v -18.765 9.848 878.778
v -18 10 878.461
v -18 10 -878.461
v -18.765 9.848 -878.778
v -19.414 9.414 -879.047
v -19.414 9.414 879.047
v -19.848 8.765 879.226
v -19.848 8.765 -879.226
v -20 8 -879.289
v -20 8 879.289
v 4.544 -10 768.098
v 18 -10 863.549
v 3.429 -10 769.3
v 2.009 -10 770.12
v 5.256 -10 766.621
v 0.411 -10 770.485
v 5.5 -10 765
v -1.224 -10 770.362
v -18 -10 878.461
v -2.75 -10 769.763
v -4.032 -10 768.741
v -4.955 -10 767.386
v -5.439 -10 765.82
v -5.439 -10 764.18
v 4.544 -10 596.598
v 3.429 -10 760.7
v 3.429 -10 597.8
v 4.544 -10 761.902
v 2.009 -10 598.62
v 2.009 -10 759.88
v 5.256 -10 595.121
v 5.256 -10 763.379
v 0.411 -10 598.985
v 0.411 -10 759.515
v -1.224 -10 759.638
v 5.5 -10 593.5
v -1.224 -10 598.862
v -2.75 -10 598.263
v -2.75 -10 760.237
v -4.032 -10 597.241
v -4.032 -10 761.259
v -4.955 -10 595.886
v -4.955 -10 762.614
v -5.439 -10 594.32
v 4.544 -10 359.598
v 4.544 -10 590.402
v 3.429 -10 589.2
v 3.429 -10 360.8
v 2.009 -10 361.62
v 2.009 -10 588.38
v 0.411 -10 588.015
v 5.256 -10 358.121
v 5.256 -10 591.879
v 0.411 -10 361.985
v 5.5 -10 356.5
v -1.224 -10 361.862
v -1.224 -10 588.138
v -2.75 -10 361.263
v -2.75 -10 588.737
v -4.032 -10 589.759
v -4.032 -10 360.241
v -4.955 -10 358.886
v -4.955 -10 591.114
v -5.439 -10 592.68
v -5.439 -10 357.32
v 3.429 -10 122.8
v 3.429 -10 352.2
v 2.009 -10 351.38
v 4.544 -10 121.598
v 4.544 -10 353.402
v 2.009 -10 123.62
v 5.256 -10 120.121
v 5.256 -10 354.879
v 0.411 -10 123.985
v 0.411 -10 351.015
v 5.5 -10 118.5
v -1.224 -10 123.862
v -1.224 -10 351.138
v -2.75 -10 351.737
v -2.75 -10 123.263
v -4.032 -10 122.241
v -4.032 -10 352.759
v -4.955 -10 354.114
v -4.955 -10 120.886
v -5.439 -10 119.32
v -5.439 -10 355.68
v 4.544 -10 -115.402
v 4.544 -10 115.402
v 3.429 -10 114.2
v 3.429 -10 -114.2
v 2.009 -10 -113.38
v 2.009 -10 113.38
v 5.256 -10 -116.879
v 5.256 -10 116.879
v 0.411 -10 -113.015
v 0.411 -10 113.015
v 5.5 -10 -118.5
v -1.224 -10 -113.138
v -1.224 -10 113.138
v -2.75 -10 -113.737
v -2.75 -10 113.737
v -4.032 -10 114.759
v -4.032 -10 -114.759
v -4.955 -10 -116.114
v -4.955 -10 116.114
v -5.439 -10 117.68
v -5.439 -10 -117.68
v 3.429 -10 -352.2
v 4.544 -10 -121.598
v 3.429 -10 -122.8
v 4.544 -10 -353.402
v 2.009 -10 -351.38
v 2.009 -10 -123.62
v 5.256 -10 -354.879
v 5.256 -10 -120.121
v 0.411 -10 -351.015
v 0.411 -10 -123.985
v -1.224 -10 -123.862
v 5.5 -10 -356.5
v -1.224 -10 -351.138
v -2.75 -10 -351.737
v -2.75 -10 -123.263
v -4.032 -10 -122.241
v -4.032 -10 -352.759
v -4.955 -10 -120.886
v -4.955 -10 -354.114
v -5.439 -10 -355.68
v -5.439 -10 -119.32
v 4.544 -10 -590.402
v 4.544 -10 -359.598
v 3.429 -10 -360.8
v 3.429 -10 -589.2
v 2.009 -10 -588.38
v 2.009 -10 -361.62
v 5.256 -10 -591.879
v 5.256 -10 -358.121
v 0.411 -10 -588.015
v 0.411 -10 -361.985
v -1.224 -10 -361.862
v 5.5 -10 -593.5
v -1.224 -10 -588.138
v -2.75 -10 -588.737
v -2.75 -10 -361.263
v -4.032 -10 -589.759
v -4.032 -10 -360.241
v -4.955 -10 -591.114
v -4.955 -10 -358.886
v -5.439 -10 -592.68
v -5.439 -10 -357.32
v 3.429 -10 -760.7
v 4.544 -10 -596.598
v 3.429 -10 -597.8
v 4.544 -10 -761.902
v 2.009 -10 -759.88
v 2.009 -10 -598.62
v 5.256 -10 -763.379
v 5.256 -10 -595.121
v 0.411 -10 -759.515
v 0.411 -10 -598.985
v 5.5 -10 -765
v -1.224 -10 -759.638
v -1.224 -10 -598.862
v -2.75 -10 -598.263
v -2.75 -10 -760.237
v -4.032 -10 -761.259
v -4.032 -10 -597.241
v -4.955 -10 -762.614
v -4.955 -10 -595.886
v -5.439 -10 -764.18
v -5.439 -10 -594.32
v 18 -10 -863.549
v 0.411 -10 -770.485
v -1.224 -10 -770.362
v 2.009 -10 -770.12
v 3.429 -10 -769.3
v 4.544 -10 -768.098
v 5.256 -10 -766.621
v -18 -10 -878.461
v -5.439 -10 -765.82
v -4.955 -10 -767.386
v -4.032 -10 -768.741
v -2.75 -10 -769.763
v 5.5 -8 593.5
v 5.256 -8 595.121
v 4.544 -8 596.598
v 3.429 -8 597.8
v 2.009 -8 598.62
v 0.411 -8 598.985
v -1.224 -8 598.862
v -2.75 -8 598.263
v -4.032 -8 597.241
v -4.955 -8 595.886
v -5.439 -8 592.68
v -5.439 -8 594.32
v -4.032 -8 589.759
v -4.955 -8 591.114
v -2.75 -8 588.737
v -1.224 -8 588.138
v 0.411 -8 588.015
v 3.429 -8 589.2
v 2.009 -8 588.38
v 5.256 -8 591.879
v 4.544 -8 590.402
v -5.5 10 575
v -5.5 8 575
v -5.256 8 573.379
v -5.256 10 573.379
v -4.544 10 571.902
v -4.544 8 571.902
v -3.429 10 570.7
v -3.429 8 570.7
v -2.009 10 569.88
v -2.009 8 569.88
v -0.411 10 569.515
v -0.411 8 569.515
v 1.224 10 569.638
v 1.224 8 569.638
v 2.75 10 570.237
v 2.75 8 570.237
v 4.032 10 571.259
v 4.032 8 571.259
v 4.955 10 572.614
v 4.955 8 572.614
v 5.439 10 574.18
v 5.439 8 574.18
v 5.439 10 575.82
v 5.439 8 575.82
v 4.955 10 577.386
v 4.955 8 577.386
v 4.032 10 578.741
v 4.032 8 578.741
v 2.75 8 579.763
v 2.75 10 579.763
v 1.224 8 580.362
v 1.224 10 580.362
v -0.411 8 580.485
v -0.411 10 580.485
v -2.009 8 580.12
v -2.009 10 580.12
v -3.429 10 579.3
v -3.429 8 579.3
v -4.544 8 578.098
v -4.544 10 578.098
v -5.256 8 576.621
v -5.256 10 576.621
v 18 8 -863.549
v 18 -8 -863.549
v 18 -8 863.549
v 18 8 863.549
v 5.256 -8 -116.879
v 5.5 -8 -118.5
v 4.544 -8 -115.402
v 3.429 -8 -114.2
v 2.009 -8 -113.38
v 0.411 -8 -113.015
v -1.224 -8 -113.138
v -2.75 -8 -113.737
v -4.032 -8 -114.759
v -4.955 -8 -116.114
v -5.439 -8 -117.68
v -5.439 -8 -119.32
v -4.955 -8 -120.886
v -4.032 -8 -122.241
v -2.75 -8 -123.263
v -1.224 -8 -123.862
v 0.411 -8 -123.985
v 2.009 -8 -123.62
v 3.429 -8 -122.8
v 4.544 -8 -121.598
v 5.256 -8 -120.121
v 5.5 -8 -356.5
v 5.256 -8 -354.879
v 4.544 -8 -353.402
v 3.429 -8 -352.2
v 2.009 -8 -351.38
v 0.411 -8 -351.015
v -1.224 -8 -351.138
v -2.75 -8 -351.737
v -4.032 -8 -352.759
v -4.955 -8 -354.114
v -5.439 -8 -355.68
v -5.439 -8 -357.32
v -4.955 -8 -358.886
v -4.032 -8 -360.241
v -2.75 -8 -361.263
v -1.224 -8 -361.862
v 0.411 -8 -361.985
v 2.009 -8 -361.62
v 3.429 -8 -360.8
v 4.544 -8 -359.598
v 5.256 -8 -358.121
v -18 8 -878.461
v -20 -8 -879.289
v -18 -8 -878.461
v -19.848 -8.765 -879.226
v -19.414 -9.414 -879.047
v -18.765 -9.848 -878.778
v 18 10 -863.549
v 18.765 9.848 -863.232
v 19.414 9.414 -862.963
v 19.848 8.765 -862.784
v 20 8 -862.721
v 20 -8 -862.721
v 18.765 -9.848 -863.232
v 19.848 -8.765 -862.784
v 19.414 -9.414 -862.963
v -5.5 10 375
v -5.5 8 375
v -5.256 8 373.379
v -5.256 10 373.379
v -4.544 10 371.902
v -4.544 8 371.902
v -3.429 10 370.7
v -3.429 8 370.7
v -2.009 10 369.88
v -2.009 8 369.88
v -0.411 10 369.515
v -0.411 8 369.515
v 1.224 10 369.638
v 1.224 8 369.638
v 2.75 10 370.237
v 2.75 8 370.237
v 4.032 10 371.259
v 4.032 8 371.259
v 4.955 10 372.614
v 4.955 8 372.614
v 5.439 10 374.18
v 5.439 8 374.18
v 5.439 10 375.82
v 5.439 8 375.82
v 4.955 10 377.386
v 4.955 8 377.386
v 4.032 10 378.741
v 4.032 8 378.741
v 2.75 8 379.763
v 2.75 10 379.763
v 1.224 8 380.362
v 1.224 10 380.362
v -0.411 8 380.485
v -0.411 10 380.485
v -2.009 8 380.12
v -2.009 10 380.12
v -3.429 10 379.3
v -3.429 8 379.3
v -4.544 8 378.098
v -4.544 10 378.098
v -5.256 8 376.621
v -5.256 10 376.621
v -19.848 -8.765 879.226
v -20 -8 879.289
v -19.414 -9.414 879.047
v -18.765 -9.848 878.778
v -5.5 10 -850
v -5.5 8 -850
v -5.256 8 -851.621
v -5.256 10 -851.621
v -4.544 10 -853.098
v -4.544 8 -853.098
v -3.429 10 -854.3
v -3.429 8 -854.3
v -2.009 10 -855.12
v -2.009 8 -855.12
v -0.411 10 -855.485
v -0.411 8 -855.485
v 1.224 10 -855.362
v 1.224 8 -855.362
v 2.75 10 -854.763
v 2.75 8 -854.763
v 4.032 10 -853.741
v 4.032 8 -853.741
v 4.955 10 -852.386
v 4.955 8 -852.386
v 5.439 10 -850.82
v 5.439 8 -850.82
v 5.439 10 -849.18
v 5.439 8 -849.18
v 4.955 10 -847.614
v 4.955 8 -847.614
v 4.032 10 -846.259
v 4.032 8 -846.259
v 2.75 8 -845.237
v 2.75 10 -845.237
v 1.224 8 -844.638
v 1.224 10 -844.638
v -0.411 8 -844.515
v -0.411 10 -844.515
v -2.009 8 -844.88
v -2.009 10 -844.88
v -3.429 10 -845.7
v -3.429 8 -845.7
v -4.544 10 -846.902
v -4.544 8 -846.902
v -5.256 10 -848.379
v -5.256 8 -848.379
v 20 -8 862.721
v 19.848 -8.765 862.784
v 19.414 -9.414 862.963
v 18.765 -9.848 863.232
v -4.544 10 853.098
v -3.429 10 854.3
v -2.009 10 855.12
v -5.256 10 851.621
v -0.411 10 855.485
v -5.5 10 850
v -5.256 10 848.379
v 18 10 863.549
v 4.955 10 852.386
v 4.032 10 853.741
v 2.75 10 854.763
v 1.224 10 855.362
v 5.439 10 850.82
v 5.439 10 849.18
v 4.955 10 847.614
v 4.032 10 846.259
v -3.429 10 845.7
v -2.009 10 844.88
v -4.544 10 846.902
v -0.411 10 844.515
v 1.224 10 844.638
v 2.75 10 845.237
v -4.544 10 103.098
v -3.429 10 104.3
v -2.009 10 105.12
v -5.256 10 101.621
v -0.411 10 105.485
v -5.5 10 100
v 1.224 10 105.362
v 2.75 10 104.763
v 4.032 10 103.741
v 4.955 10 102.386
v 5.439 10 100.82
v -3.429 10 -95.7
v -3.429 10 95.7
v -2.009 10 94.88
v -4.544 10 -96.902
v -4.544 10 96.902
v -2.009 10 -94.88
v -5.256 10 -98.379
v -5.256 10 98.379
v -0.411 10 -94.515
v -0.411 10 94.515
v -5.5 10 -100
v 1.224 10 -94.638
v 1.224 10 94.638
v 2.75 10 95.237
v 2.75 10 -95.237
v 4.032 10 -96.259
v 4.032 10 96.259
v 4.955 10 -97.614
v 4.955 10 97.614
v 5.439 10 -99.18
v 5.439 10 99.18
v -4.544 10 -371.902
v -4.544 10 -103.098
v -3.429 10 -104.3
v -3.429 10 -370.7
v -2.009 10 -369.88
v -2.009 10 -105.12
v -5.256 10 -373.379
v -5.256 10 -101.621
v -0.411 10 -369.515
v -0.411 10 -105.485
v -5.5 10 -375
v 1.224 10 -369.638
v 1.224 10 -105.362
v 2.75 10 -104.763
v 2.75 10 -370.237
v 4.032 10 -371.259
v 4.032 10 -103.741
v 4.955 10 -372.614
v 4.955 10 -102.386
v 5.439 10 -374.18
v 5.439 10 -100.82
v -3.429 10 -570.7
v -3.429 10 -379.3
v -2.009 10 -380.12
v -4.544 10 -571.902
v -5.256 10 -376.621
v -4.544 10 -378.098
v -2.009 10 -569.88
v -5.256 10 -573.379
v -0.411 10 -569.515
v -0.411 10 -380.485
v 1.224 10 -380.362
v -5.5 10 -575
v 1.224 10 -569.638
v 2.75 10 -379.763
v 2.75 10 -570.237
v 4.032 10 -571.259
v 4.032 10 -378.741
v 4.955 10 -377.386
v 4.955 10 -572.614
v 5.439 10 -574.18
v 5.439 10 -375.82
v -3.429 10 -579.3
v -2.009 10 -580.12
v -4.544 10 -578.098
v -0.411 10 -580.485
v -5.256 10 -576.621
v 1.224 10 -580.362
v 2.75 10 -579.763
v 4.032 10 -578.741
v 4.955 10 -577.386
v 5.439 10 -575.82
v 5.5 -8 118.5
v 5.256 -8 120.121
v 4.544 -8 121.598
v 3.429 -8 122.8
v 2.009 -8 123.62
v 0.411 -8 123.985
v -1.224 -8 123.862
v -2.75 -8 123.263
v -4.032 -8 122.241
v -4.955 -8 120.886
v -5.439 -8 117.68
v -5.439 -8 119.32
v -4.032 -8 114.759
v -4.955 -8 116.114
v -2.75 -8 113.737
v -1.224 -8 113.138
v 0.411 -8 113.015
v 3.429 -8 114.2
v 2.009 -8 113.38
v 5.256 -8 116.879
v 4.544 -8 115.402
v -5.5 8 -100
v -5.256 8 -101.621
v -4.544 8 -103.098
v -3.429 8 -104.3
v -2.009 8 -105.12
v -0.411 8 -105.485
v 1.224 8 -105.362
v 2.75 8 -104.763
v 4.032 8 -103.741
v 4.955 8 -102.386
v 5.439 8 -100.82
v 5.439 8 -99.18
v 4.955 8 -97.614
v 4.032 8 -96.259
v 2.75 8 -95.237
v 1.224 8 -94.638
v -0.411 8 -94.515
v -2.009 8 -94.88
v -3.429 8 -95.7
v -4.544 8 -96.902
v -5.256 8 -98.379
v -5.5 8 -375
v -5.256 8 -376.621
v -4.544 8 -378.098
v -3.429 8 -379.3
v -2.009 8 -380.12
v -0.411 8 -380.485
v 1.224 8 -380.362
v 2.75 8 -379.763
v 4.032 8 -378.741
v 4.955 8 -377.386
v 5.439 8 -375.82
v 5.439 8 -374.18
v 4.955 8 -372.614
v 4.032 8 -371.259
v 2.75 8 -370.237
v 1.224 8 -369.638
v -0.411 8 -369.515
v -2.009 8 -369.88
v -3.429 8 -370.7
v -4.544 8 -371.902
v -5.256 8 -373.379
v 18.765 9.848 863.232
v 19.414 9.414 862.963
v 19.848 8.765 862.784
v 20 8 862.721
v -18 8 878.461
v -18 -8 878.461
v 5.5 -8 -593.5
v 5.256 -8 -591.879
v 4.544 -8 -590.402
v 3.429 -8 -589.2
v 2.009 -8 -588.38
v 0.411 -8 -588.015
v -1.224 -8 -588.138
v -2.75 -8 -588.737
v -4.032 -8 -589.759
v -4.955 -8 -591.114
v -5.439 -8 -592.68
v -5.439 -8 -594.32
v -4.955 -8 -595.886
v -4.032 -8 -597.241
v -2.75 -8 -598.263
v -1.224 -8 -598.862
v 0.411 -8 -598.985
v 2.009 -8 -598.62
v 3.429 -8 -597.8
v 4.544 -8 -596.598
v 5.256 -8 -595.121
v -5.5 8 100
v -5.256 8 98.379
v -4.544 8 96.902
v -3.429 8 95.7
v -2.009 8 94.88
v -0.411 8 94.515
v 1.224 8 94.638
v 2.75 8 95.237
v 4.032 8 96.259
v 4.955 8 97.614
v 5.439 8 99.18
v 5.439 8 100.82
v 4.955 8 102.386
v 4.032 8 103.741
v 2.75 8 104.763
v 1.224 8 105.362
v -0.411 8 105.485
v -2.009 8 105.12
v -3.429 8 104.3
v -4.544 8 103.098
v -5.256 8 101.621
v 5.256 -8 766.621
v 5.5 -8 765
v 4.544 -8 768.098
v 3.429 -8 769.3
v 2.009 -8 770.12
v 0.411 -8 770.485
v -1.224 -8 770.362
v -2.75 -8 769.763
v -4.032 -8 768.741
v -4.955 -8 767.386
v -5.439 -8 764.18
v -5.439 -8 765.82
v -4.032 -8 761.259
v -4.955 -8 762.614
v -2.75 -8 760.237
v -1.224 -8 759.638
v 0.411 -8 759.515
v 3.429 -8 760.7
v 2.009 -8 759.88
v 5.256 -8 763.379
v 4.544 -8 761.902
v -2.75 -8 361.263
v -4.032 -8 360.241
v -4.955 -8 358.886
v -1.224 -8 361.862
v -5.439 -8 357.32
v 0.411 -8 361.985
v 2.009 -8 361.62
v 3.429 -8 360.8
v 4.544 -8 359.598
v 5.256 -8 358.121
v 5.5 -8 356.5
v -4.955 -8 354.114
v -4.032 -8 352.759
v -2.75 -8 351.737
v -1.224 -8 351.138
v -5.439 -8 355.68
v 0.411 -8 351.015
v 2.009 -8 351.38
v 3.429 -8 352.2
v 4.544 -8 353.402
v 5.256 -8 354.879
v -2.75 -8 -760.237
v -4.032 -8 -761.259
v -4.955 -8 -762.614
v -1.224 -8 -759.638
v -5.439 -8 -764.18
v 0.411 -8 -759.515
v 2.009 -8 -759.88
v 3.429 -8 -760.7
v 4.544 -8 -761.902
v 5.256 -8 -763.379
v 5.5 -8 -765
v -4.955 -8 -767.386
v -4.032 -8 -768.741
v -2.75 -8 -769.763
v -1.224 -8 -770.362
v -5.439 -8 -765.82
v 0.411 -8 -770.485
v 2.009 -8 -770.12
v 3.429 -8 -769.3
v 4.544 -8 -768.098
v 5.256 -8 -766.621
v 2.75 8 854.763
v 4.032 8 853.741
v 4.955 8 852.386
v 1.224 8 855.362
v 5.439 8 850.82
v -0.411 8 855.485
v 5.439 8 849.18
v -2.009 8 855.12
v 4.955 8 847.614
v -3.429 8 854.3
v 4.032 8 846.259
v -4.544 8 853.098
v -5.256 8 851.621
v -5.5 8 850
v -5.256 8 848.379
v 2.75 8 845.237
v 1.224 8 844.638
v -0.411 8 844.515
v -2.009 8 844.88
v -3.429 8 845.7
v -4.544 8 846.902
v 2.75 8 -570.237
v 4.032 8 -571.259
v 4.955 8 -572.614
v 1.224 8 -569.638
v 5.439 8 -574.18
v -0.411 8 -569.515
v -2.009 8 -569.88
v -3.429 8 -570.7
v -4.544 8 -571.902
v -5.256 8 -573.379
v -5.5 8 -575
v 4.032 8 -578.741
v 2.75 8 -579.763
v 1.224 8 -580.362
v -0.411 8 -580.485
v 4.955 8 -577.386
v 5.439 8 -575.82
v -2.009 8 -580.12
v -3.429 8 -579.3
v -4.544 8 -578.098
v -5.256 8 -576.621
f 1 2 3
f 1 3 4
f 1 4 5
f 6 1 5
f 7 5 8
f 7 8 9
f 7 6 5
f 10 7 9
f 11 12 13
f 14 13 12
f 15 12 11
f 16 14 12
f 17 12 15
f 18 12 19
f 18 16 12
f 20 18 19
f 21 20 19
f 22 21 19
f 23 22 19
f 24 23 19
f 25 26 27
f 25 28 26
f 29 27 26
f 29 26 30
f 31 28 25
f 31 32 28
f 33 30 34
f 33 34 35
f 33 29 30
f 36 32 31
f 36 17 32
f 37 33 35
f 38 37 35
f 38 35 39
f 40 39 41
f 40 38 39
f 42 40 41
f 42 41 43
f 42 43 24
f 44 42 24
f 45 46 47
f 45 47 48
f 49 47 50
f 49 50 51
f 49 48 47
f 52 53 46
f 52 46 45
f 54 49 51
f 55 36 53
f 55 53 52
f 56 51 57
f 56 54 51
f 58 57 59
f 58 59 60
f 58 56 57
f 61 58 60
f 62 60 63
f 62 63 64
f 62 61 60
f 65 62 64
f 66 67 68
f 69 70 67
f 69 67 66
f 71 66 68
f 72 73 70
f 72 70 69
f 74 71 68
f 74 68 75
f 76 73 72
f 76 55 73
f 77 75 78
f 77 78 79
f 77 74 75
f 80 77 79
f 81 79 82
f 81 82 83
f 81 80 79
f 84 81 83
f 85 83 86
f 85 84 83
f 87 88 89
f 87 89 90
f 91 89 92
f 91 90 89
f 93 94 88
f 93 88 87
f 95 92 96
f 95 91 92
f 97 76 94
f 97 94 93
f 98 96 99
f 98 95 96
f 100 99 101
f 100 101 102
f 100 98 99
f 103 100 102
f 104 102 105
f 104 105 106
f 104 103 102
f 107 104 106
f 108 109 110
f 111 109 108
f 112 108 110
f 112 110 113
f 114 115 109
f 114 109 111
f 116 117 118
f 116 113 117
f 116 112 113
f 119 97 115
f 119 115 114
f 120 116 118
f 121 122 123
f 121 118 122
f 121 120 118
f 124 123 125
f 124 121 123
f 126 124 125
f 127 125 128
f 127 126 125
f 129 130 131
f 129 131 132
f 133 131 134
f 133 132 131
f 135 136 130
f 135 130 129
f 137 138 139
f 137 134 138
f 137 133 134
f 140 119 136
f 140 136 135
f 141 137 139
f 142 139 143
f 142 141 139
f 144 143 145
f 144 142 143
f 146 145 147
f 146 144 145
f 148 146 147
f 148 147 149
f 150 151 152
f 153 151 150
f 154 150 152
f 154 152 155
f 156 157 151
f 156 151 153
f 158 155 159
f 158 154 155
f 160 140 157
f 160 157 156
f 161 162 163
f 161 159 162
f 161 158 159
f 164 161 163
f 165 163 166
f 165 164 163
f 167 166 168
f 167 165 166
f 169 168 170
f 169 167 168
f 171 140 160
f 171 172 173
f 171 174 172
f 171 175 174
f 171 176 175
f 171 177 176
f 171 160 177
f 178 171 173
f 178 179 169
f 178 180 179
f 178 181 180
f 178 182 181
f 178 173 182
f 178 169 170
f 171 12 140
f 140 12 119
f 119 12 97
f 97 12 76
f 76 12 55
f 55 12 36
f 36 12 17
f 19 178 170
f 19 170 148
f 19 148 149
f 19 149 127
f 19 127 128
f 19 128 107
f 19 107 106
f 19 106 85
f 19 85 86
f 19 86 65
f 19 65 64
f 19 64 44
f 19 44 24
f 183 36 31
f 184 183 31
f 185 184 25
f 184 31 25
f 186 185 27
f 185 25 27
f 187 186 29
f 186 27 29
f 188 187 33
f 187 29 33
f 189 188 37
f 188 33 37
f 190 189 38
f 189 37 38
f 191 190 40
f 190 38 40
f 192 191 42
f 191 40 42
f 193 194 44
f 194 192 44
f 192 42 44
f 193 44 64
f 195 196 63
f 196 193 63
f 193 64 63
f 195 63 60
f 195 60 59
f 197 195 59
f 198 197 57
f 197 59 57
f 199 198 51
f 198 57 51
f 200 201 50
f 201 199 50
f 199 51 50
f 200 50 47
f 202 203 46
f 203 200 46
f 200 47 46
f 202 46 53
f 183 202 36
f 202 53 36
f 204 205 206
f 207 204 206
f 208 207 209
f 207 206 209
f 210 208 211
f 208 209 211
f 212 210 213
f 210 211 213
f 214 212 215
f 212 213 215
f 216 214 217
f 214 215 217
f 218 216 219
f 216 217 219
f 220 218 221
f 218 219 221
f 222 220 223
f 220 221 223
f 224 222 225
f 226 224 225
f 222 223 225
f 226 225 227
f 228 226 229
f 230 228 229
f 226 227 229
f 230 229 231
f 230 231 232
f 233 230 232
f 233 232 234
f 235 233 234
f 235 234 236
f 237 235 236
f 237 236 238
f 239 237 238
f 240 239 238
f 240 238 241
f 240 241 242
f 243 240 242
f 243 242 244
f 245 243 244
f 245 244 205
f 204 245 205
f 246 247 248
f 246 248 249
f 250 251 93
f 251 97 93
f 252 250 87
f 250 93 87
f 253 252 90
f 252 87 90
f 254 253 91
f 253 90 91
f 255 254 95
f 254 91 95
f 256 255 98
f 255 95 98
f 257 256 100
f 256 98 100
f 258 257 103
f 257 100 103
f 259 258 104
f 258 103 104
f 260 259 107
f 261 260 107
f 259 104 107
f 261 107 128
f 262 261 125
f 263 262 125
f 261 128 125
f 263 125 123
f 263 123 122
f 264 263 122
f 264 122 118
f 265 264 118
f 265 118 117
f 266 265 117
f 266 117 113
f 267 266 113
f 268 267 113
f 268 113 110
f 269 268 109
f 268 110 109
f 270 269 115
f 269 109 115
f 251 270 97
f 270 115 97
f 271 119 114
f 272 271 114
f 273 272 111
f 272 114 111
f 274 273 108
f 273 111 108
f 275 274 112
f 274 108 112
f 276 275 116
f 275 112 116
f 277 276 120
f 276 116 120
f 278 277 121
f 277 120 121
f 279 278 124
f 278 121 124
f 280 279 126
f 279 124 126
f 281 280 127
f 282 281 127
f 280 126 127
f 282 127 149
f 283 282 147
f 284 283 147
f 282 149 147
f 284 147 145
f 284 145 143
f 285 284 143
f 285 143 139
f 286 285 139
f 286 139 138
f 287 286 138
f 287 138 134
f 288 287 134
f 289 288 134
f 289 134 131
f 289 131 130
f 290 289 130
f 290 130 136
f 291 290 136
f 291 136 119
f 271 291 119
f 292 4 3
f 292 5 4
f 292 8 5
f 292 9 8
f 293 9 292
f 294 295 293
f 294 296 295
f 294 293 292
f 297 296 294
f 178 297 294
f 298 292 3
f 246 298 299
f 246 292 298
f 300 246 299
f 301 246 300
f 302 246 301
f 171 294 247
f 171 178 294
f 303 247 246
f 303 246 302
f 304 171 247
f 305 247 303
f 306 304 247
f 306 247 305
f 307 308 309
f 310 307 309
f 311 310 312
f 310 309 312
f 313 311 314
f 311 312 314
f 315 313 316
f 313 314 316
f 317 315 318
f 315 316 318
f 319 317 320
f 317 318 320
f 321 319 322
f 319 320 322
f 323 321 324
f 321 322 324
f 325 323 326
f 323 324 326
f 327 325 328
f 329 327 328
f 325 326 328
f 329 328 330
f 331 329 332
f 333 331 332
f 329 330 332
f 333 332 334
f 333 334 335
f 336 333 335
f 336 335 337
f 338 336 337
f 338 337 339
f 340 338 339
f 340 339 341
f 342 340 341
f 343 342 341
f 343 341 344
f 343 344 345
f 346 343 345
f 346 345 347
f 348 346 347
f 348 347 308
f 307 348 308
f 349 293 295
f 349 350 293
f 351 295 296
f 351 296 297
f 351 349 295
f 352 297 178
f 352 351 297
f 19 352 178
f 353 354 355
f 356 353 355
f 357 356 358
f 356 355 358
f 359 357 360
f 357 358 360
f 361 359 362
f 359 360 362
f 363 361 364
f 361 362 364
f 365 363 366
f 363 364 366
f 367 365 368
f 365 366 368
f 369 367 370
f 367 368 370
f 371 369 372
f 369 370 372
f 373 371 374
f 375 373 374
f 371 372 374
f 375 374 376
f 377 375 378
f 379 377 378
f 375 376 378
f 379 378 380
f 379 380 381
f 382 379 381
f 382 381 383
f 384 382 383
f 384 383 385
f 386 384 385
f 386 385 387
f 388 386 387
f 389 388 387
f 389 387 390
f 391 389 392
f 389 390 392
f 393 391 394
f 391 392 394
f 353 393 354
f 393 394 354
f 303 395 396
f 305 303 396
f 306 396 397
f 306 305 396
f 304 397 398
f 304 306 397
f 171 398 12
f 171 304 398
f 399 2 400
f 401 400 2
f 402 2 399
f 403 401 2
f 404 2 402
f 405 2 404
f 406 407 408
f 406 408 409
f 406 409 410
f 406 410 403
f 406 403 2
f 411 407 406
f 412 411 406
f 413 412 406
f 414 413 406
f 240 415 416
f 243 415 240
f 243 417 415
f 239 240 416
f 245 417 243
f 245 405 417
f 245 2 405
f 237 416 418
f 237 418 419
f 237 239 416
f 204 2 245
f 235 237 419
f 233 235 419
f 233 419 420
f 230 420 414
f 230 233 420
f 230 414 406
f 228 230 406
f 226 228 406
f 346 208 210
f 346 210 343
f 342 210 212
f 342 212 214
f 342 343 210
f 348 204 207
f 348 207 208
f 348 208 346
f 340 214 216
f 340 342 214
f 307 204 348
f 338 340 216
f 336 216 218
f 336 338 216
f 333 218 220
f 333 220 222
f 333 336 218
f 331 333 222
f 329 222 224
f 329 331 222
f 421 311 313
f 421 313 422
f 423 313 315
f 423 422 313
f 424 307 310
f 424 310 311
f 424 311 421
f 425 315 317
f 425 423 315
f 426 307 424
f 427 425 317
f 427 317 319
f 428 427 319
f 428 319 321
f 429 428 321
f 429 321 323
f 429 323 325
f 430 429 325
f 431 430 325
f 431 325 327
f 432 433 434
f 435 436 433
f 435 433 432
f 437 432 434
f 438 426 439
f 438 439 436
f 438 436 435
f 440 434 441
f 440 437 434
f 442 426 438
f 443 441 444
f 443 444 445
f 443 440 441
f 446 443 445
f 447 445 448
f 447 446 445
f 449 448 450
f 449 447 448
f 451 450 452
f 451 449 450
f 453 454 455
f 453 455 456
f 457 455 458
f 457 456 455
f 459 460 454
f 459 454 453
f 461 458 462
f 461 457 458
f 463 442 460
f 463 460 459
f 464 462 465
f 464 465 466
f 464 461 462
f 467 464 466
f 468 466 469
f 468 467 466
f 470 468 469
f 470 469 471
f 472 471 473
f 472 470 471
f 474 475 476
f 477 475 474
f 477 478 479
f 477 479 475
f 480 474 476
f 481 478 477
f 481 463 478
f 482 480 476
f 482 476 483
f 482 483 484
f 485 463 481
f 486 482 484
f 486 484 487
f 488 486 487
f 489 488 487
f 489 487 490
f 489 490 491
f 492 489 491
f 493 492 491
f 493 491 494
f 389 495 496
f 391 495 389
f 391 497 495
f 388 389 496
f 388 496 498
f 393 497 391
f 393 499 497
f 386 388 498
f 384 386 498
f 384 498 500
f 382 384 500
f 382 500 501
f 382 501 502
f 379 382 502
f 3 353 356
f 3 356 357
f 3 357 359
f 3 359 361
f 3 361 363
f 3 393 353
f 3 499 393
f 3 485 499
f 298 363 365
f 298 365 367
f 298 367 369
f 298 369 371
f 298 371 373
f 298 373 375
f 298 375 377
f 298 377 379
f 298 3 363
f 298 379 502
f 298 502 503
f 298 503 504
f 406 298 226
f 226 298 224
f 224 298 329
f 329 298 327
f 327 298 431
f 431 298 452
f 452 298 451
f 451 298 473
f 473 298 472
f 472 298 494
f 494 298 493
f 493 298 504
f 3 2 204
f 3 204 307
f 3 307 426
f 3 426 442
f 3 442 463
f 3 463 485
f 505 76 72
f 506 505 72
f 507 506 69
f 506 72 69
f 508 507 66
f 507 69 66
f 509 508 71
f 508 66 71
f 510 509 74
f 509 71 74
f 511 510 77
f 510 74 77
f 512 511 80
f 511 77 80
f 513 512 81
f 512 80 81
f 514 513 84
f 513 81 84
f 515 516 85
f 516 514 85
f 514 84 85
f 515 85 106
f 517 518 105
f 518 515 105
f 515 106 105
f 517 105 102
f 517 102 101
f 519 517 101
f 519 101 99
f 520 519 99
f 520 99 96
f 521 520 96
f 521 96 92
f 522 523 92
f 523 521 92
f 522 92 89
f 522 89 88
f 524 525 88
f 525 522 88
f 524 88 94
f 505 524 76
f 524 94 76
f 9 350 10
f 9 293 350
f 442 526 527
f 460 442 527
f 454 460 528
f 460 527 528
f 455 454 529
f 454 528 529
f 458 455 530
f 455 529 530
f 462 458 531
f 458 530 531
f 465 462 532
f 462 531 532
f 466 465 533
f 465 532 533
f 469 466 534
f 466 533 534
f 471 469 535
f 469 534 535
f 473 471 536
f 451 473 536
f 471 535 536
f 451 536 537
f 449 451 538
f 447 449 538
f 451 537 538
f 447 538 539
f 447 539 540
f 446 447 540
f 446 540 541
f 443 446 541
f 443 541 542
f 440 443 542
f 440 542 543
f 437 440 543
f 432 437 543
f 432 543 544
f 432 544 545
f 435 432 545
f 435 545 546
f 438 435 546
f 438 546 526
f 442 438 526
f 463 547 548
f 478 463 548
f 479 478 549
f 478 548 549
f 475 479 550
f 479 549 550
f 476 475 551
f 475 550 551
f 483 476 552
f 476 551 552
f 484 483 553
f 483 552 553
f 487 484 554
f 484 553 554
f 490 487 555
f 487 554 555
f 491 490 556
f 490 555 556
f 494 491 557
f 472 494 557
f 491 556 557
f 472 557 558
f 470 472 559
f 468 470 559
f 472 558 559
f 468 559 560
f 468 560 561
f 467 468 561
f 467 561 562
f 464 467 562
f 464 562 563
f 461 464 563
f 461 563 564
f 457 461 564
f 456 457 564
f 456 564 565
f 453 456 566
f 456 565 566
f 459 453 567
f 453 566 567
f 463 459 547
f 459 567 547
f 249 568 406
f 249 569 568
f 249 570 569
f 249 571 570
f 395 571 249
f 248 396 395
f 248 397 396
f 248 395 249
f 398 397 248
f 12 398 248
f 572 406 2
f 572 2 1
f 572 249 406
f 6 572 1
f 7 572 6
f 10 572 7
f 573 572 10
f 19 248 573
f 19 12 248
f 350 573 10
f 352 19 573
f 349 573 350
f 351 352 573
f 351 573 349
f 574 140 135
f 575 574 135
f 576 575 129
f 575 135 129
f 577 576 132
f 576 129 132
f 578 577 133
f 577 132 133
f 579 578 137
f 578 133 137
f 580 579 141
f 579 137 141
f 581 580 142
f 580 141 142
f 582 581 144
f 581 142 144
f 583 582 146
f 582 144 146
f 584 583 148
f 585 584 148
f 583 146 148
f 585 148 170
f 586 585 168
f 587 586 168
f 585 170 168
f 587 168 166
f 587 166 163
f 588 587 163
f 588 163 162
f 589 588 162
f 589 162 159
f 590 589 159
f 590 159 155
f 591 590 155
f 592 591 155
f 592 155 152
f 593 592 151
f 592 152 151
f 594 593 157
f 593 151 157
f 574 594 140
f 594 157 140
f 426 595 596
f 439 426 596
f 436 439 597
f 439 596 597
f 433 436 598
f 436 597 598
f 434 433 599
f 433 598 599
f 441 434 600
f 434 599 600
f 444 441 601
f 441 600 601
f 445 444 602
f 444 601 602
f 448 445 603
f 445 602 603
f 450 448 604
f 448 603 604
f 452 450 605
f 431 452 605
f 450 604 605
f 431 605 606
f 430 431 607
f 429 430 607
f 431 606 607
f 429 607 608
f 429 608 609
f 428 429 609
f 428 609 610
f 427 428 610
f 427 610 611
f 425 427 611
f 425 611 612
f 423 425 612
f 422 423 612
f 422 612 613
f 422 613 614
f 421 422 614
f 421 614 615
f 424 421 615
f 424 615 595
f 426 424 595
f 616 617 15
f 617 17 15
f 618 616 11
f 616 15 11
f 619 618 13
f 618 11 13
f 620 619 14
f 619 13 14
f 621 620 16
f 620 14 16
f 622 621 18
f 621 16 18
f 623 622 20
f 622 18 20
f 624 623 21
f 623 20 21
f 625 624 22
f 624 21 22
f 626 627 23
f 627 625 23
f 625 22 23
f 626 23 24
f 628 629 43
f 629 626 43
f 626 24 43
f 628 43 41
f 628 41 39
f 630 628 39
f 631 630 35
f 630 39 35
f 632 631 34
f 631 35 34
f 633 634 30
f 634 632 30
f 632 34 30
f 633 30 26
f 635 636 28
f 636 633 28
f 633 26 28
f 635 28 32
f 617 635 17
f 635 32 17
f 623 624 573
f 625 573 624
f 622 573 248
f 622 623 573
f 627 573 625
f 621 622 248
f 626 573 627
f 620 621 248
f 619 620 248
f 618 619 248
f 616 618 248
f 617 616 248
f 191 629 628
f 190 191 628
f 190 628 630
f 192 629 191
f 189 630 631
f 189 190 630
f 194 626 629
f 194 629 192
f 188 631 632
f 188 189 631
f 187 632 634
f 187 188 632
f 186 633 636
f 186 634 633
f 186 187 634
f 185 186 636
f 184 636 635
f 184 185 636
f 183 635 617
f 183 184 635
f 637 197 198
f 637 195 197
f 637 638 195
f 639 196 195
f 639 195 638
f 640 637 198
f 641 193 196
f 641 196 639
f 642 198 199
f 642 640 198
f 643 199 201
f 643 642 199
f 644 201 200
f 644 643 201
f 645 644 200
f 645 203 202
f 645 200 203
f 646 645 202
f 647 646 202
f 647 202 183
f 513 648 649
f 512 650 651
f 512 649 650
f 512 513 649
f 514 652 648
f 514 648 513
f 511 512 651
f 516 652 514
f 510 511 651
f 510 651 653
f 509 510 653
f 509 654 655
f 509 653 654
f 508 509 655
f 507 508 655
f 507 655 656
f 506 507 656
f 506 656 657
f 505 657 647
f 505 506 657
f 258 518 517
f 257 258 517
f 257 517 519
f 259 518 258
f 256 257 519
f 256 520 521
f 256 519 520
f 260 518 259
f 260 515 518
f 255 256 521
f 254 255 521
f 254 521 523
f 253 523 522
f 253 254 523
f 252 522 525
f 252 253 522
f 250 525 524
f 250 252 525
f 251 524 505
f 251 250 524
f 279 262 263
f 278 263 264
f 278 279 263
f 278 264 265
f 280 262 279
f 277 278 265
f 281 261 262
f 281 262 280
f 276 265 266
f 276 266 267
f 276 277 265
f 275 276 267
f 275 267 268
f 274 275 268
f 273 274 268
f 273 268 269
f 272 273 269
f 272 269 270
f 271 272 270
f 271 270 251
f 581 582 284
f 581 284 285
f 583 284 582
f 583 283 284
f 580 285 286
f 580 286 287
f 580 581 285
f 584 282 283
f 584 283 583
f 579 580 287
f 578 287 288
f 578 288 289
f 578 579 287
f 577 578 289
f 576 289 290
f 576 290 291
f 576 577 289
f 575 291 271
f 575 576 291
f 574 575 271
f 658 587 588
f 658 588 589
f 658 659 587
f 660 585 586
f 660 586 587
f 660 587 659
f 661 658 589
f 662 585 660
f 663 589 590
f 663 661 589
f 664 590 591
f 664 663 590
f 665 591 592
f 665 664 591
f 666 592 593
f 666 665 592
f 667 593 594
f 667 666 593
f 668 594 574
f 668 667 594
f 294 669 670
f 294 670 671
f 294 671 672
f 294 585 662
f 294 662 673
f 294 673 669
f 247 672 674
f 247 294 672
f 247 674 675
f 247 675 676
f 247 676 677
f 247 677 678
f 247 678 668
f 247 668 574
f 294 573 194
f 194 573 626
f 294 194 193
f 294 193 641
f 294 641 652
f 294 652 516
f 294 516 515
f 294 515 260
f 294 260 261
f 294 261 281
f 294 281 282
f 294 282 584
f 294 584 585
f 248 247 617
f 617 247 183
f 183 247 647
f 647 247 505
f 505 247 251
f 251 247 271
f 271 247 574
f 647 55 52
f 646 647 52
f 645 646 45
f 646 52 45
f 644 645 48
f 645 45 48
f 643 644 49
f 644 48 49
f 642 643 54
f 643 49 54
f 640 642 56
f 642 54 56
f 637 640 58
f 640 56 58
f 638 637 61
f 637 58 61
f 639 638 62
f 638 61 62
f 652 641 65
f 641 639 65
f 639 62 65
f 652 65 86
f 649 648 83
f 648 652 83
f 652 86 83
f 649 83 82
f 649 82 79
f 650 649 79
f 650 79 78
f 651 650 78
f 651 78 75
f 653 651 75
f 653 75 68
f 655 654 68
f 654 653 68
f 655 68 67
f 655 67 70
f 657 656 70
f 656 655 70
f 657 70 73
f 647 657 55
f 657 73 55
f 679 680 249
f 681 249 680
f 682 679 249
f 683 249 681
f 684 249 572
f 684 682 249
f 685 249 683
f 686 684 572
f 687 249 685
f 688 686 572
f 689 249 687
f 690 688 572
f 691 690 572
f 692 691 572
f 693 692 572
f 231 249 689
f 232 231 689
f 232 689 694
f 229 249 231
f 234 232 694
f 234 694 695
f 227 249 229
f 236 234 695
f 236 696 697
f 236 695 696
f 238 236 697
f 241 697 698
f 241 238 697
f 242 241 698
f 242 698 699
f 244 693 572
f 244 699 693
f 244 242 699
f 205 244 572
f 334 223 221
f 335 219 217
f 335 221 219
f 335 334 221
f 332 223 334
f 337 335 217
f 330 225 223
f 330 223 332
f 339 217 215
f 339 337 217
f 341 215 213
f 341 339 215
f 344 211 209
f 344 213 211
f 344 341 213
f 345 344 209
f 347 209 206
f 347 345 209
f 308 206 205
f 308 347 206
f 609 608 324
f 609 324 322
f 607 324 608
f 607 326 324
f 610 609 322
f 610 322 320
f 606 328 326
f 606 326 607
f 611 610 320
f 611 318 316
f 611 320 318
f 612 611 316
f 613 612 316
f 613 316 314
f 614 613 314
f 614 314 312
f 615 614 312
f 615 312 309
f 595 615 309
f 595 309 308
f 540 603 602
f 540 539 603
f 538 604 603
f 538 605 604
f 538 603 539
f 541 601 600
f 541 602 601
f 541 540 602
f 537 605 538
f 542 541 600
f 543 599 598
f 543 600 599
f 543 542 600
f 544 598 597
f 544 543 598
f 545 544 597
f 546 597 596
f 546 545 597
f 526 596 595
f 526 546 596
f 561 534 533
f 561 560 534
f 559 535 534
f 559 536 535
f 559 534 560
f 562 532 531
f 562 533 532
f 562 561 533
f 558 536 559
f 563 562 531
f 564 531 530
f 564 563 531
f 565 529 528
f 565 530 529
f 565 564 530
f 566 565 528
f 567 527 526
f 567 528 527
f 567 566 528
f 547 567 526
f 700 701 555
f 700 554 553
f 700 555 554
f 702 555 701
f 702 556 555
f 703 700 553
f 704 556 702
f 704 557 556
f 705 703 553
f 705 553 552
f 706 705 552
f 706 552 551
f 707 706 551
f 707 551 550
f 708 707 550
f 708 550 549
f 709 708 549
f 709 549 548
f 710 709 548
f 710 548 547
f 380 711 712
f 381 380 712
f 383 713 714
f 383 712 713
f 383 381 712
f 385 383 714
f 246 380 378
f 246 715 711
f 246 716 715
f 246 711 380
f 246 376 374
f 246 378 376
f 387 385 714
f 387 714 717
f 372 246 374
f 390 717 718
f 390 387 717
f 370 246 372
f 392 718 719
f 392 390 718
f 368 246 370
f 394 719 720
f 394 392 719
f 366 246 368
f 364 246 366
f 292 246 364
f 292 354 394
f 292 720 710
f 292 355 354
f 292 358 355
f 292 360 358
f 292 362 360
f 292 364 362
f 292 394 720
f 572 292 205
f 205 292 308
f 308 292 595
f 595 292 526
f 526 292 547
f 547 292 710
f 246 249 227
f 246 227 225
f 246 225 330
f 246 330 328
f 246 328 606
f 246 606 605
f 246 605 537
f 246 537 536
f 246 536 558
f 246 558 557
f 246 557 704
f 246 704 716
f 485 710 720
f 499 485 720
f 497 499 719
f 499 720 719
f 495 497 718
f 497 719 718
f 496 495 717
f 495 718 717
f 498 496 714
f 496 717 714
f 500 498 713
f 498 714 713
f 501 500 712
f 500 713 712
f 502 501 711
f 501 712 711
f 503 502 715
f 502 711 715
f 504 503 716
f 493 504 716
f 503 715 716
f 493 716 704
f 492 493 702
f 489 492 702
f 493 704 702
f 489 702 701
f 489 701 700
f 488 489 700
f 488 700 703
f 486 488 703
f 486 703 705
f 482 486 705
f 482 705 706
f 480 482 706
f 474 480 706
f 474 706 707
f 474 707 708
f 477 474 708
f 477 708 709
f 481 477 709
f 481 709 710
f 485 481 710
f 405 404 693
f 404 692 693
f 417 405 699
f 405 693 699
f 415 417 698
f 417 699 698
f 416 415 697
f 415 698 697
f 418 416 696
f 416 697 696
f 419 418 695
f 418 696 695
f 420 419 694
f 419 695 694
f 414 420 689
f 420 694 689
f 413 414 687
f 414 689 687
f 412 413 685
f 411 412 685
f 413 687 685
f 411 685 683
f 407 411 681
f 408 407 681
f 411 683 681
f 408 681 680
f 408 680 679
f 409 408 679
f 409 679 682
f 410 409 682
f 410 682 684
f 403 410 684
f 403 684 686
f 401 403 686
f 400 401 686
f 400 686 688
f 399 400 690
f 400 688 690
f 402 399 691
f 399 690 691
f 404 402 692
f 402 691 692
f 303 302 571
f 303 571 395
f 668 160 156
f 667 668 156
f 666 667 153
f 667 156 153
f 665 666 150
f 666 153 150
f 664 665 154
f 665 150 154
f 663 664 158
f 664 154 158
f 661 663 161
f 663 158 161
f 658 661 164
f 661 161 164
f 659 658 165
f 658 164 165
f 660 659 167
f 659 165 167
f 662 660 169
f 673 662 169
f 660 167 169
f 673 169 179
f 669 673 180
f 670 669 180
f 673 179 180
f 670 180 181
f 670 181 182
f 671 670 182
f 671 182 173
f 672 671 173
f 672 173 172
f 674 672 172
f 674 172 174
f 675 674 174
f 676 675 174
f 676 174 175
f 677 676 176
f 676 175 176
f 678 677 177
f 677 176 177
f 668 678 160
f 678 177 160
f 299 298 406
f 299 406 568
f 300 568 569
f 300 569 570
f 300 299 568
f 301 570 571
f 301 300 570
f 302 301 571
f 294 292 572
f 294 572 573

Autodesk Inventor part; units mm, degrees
ref_plane "YZ Plane" through (0, 0, 0) normal (1, 0, 0) x (0, 1, 0)
ref_plane "XZ Plane" through (0, 0, 0) normal (0, 1, 0) x (-1, 0, 0)
ref_plane "XY Plane" through (0, 0, 0) normal (0, 0, 1) x (1, 0, 0)
sketch "Sketch1" plane through (0, 0, 0) normal (0, 0, 1) x (1, 0, 0)
  line L0 (-20, 10) -> (20, 10)
  line L1 (20, 10) -> (20, -10)
  line L2 (20, -10) -> (-20, -10)
  line L3 (-20, -10) -> (-20, 10)
  line L4 (-20, 10) -> (20, -10) construction
  line L5 (20, 10) -> (-20, -10) construction
  line L6 (18, 8) -> (-18, 8)
  line L7 (-18, 8) -> (-18, -8)
  line L8 (-18, -8) -> (18, -8)
  line L9 (18, -8) -> (18, 8)
  point P0 (0, 0)
  dimension "d0" = 40
  dimension "d1" = 20
  dimension "d2" = 2
extrude "Extrusion1" add sketch "Sketch1" along normal mid plane 1900
sketch "Sketch2" plane through (0, 0, 0) normal (0, 1, 0) x (-1, 0, 0)
  line L0 (20, -950) -> (20, 950) projected
  line L1 (-20, 950) -> (20, 950)
  line L2 (-20, -950) -> (-20, 950) projected
  line L3 (20, -950) -> (-20, -950) projected
  line L4 (-20, -950) -> (-50.7107, -950)
  line L5 (-50.7107, -950) -> (-50.7107, 950)
  line L6 (-50.7107, 950) -> (-20, 950)
  line L7 (20, -879.2893) -> (-50.7107, -950)
  line L8 (20, -879.2893) -> (-20, -862.7208)
  line L9 (-20, -950) -> (-20, 950) projected
  point P0 (0, 0)
  point P1 (-20, -919.2893)
  dimension "d5" = 45
  dimension "d6" = 100
  dimension "d19" = 67.5
extrude "Extrusion2" cut sketch "Sketch2" along normal through all both and the other way through all contours L3 L2 L7 L0 | L7 L2 L8
mirror "Mirror1" about plane through (0, 0, 0) normal (0, 0, 1) of "Extrusion2"
sketch "Sketch3" plane through (0, 0, 0) normal (0, 1, 0) x (-1, 0, 0)
  line L0 (0, 0) -> (0, -871.0051) construction
  line L1 (-20, -862.7208) -> (-20, 862.7208) construction
  line L2 (-20, -475) -> (20, -475) construction
  line L3 (20, 879.2893) -> (20, -879.2893) construction
  circle A0 centre (0, -100) radius 5.5
  circle A1 centre (0, -375) radius 5.5
  circle A2 centre (0, -575) radius 5.5
  circle A3 centre (0, -850) radius 5.5
  line L4 (20, 879.2893) -> (20, -879.2893) construction
  line L5 (-20, -862.7208) -> (20, -879.2893) construction
  dimension "d9" = 475
  dimension "d10" = 11
  dimension "d11" = 275
  dimension "d12" = 275
  dimension "d13" = 100
  dimension "d14" = 100
  dimension "d15" = 100
extrude "Extrusion3" cut sketch "Sketch3" along normal through all
sketch "Sketch5" plane through (-20, -10, -879.2893) normal (0, -1, 0) x (1, 0, 0)
  line L0 (40, 1742.0101) -> (0, 1758.5786) construction
  line L1 (0, 1758.5786) -> (0, 0) construction
  line L2 (0, 0) -> (40, 16.5685) construction
  line L3 (40, 16.5685) -> (40, 1742.0101) construction
  circle A0 centre (20, 114.2893) radius 5.5
  circle A1 centre (20, 760.7893) radius 5.5
  circle A2 centre (20, 285.7893) radius 5.5
  circle A3 centre (20, 522.7893) radius 5.5
  line L4 (20, 522.7893) -> (20, 285.7893) construction
  point P0 (20, 879.2893)
  point P1 (20, 8.2843)
  point P2 (20, 404.2893)
  dimension "d20" = 765
  dimension "d21" = 11
  dimension "d24" = 11
  dimension "d25" = 118.5
  dimension "d26" = 237
  dimension "d27" = 475
extrude "Extrusion4" cut sketch "Sketch5" against normal up to surface (2 mm away)
mirror "Mirror2" about plane through (0, 0, 0) normal (0, 0, 1) of "Extrusion3", "Extrusion4"
fillet "Fillet1" radius 2 4 edges at (-20, 10, 0) (-20, -10, 0) (20, -10, 0) (20, 10, 0)
equation "\"d19\" = 1.5 * d5"
equation "\"d11\" = d12"
equation "\"d13\" = d15"
equation "\"d14\" = d15"
properties part number "Long tube 1"
